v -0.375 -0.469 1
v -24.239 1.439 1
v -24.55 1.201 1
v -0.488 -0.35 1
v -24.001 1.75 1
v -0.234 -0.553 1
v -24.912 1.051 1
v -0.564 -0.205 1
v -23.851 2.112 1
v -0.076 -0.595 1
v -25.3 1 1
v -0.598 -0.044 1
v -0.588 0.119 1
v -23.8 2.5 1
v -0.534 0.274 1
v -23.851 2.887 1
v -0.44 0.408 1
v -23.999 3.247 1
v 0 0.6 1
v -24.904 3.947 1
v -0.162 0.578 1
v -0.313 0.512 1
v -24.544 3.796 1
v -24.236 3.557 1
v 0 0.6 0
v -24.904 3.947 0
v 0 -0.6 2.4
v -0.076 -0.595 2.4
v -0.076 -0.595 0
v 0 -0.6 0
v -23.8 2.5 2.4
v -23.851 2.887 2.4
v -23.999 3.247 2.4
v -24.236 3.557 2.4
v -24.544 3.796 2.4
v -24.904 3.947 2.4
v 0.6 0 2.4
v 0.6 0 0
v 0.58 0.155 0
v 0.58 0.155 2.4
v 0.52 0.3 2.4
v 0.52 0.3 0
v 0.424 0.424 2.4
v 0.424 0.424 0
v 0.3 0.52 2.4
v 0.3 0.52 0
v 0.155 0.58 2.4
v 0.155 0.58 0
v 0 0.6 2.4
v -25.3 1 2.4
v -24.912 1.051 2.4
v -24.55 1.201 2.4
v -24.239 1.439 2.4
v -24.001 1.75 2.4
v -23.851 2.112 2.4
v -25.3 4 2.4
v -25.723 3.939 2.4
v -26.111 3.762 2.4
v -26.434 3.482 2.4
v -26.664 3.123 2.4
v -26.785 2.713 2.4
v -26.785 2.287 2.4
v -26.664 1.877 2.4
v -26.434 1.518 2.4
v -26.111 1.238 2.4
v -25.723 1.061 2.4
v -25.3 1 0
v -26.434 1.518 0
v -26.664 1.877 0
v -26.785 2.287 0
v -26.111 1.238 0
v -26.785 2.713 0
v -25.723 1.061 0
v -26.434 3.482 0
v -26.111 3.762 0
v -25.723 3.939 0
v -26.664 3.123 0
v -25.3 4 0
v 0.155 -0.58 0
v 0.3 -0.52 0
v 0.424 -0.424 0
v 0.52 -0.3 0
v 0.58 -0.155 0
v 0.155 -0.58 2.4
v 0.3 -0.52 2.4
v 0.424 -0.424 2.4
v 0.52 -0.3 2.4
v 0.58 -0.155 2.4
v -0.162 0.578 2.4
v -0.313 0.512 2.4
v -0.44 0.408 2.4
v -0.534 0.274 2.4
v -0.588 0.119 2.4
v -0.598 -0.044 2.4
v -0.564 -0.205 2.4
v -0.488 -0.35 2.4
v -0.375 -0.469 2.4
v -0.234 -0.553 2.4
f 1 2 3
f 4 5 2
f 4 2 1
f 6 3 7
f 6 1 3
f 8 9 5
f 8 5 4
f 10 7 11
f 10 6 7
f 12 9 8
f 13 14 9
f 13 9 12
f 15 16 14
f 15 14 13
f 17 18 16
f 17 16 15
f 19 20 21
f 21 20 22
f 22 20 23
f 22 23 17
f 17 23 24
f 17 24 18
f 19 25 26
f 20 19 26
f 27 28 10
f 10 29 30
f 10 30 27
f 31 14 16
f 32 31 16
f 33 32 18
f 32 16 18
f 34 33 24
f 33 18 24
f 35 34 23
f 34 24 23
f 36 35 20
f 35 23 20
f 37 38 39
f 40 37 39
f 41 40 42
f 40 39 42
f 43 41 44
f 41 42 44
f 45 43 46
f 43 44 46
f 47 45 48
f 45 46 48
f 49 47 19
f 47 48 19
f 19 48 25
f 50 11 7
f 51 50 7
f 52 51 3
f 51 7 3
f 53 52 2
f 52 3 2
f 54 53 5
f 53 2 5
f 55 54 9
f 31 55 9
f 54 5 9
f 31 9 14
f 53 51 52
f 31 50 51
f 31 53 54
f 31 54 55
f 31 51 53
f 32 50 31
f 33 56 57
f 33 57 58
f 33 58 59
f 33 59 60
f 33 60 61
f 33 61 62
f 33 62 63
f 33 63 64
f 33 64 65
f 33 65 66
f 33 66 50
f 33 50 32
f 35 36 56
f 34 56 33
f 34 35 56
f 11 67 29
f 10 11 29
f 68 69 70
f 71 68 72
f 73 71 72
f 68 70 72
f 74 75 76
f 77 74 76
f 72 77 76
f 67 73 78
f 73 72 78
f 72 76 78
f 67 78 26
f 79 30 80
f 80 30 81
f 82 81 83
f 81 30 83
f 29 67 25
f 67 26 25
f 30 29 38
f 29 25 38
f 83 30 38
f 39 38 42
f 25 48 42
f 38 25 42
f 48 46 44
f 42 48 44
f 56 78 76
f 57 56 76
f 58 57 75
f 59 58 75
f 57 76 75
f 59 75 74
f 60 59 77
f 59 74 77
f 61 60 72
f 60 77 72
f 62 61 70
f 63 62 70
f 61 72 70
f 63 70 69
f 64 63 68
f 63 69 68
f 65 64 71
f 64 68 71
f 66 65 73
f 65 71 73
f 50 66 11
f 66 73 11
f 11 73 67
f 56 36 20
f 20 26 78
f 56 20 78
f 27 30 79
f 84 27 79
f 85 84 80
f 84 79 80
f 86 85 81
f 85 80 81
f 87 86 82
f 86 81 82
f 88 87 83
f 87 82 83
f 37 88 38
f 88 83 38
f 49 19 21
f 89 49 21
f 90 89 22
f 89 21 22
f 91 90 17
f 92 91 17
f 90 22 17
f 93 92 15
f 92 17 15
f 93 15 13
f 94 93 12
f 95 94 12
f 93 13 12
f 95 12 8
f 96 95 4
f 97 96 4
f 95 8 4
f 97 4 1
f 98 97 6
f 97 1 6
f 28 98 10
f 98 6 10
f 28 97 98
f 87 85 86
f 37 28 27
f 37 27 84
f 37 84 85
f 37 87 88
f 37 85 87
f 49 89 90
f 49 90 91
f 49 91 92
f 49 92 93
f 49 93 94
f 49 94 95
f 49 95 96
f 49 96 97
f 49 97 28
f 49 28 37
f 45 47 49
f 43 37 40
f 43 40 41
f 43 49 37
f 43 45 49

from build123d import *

# Parameters (mm, degrees)
SALIENTE_EXTRUIR1_DEPTH   = 2.4
SALIENTE_EXTRUIR1_2_DEPTH = 2.4
SALIENTE_EXTRUIR2_DEPTH   = 1


with BuildPart() as part:
    # Croquis1 → Saliente-Extruir1 (new body)
    with BuildSketch(Plane.XY):
        with BuildLine():
            Line((-24.903989872, 3.946781248), (-25.3, 4))
            ThreePointArc((-25.3, 4), (-25.499785045, 1.013364222), (-24.903989872, 3.946781248))
        make_face()
    extrude(amount=SALIENTE_EXTRUIR1_DEPTH)



with BuildPart() as body_2:
    # Croquis1 → Saliente-Extruir1 2 (new body)
    with BuildSketch(Plane.XY):
        with BuildLine():
            ThreePointArc((0, -0.6), (0.037869012, 0.598803756), (-0.075587022, -0.595219793))
            Line((-0.075587022, -0.595219793), (0, -0.6))
        make_face()
    extrude(amount=SALIENTE_EXTRUIR1_2_DEPTH)


with BuildPart() as part_1:
    add(part.part)

    add(body_2.part)  # Saliente-Extruir2 merges body 2
    # Croquis1<3> → Saliente-Extruir2 (add)
    with BuildSketch(Plane.XY):
        with BuildLine():
            Line((0, 0.6), (-24.903989872, 3.946781248))
            ThreePointArc((-24.903989872, 3.946781248), (-24.1075204, 3.409940879), (-23.8, 2.5))
            ThreePointArc((-23.8, 2.5), (-24.239339828, 1.439339828), (-25.3, 1))
            Line((-25.3, 1), (-0.075587022, -0.595219793))
            ThreePointArc((-0.075587022, -0.595219793), (-0.598803756, 0.037869012), (0, 0.6))
        make_face()
    extrude(amount=SALIENTE_EXTRUIR2_DEPTH)


solid = part_1.part
